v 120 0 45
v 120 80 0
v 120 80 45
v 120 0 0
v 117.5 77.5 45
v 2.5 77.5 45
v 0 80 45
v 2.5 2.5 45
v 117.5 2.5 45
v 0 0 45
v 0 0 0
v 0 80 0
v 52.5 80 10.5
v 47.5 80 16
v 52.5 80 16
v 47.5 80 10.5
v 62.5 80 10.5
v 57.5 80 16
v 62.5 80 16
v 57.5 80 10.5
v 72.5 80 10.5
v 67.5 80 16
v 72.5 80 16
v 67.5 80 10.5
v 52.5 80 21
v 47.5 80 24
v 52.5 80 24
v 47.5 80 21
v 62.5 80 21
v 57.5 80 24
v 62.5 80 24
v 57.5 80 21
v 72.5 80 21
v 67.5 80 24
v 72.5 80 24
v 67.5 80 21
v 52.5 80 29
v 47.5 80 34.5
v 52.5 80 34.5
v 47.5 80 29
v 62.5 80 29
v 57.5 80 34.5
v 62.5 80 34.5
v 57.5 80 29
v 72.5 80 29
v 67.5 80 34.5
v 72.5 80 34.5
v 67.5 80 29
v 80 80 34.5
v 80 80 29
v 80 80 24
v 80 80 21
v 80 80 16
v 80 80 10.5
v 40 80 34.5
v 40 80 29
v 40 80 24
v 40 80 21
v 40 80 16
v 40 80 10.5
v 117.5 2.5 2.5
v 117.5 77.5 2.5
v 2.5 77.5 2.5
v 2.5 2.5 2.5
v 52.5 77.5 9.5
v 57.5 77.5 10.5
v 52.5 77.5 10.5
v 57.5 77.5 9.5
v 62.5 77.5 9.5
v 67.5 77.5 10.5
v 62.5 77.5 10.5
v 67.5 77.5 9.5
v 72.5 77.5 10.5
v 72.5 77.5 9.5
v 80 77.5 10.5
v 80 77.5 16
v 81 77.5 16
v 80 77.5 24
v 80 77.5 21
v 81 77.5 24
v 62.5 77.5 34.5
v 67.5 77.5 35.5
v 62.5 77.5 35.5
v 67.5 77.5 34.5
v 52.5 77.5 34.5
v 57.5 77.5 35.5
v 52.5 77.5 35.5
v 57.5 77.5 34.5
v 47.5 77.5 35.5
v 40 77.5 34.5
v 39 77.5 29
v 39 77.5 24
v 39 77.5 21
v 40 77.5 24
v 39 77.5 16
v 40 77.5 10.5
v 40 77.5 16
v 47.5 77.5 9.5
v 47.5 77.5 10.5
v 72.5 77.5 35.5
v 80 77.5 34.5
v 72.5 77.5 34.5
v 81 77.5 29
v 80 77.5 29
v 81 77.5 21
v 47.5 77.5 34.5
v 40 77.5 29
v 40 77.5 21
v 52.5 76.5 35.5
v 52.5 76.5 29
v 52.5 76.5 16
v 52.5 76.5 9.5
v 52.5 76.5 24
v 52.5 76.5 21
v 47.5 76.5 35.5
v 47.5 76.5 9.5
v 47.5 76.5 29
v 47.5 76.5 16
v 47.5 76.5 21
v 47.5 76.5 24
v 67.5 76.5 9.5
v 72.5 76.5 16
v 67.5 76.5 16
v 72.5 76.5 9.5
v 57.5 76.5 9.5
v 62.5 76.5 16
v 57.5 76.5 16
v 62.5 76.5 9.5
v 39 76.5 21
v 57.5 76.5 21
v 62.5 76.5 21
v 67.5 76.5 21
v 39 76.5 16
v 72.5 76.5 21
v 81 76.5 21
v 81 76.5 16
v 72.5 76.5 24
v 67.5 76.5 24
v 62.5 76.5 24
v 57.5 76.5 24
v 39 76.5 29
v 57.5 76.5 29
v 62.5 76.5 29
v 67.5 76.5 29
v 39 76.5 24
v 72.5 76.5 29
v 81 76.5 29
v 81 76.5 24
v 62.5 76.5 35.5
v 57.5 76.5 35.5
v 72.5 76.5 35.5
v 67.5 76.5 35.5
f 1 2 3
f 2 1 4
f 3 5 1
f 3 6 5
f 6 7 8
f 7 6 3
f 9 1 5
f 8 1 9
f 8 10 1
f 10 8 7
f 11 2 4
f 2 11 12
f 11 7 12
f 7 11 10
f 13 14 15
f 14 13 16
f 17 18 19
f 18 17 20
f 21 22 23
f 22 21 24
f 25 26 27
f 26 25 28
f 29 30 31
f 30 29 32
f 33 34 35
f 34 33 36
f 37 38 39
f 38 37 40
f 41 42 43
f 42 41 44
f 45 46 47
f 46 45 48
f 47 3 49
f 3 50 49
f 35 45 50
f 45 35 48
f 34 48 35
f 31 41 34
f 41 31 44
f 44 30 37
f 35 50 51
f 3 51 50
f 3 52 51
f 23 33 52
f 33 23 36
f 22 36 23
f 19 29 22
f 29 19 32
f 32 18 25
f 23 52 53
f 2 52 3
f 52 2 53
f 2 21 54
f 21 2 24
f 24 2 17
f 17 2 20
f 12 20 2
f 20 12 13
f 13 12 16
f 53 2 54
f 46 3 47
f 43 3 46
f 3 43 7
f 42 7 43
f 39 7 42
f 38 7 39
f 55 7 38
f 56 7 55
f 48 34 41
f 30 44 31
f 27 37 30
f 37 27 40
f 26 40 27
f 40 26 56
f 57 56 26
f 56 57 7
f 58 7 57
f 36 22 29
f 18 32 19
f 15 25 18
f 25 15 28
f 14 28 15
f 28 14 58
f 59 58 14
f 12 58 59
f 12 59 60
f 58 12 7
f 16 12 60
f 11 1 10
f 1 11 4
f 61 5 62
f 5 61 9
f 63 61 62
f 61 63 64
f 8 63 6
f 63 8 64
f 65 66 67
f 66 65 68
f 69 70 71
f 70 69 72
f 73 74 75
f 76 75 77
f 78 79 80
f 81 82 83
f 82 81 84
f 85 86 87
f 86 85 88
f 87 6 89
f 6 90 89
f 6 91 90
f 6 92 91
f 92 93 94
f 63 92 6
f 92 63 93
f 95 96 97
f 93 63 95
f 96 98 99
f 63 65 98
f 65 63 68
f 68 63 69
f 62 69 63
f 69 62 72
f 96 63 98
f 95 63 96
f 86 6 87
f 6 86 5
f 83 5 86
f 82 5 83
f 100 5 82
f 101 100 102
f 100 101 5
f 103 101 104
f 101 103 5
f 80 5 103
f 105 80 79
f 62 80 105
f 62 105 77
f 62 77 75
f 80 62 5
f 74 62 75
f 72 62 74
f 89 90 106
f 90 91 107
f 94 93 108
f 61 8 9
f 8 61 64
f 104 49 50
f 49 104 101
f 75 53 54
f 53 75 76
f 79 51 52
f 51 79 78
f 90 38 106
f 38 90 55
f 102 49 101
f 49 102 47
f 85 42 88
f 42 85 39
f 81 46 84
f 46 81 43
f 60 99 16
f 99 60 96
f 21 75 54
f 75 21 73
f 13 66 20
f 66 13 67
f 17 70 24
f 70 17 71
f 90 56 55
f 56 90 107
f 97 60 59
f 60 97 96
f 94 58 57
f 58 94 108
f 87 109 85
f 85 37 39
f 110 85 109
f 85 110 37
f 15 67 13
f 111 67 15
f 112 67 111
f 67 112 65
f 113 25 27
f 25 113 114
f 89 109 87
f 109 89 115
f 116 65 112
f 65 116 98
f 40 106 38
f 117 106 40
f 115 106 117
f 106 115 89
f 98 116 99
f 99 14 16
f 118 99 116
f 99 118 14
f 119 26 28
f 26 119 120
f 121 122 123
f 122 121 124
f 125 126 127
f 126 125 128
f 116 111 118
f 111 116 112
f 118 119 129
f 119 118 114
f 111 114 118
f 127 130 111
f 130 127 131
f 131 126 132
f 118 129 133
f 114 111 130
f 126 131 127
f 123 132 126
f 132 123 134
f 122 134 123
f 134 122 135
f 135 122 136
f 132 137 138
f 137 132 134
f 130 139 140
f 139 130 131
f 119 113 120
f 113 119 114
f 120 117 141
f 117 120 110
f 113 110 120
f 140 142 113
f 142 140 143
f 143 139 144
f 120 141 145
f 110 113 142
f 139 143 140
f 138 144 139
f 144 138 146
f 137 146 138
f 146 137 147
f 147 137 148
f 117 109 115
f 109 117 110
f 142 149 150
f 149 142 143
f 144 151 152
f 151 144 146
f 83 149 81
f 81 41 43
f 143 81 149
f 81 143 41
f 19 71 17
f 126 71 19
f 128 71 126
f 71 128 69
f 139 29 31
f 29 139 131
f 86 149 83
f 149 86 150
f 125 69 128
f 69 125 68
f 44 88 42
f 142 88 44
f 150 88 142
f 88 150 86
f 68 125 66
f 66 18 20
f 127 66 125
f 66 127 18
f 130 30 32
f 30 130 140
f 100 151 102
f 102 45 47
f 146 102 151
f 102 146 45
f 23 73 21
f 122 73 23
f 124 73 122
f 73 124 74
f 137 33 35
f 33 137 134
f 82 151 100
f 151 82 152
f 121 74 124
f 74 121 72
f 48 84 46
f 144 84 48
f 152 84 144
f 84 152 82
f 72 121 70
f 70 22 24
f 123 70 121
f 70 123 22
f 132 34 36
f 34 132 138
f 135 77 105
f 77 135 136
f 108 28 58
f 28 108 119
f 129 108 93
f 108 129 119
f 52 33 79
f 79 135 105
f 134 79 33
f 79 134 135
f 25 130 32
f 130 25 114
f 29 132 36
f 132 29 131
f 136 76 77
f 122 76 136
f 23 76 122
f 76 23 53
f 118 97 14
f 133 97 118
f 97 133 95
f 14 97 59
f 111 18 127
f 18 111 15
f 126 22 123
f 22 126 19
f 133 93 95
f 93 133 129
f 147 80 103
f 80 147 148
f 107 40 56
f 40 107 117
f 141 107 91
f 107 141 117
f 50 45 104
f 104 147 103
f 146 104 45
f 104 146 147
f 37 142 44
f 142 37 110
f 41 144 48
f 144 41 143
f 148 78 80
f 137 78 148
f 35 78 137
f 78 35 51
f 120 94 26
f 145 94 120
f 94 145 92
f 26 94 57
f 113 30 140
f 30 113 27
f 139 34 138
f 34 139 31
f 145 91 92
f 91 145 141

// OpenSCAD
$fn = 32;

// ----------------------------------------------------------------------
// Vent box: crossgrid enclosure
// ----------------------------------------------------------------------

// --- parameters (mm) ---
box_l = 120;              // box length, X
box_w = 80;               // box width, Y
box_h = 45;               // box height, Z
wall_t = 2.5;             // shell wall thickness
win_l = 40;               // vent window width, X
win_h = 24;               // vent window height, Z
bar_w = 5;                // grid bar width
n_v = 3;                  // vertical bar count
n_h = 2;                  // horizontal bar count

win_z0 = (box_h - win_h) / 2;  // window lower edge Z
v_step = win_l / (n_v + 1);  // vertical bar step
h_step = win_h / (n_h + 1);  // horizontal bar step

difference() {
  union() {
    difference() {
      cube([box_l, box_w, box_h]);
  translate([wall_t, wall_t, wall_t])
    cube([box_l - 2 * wall_t, box_w - 2 * wall_t, box_h]);
  translate([(box_l - win_l) / 2, box_w - wall_t - 1, win_z0])
    cube([win_l, wall_t + 2, win_h]);
    }
    for (i = [1 : n_v])
      translate([(box_l - win_l) / 2 + i * v_step - bar_w / 2,
                 box_w - wall_t - 1, win_z0 - 1])
        cube([bar_w, wall_t + 1, win_h + 2]);
    for (i = [1 : n_h])
      translate([(box_l - win_l) / 2 - 1, box_w - wall_t - 1,
                 win_z0 + i * h_step - bar_w / 2])
        cube([win_l + 2, wall_t + 1, bar_w]);
  }
}
